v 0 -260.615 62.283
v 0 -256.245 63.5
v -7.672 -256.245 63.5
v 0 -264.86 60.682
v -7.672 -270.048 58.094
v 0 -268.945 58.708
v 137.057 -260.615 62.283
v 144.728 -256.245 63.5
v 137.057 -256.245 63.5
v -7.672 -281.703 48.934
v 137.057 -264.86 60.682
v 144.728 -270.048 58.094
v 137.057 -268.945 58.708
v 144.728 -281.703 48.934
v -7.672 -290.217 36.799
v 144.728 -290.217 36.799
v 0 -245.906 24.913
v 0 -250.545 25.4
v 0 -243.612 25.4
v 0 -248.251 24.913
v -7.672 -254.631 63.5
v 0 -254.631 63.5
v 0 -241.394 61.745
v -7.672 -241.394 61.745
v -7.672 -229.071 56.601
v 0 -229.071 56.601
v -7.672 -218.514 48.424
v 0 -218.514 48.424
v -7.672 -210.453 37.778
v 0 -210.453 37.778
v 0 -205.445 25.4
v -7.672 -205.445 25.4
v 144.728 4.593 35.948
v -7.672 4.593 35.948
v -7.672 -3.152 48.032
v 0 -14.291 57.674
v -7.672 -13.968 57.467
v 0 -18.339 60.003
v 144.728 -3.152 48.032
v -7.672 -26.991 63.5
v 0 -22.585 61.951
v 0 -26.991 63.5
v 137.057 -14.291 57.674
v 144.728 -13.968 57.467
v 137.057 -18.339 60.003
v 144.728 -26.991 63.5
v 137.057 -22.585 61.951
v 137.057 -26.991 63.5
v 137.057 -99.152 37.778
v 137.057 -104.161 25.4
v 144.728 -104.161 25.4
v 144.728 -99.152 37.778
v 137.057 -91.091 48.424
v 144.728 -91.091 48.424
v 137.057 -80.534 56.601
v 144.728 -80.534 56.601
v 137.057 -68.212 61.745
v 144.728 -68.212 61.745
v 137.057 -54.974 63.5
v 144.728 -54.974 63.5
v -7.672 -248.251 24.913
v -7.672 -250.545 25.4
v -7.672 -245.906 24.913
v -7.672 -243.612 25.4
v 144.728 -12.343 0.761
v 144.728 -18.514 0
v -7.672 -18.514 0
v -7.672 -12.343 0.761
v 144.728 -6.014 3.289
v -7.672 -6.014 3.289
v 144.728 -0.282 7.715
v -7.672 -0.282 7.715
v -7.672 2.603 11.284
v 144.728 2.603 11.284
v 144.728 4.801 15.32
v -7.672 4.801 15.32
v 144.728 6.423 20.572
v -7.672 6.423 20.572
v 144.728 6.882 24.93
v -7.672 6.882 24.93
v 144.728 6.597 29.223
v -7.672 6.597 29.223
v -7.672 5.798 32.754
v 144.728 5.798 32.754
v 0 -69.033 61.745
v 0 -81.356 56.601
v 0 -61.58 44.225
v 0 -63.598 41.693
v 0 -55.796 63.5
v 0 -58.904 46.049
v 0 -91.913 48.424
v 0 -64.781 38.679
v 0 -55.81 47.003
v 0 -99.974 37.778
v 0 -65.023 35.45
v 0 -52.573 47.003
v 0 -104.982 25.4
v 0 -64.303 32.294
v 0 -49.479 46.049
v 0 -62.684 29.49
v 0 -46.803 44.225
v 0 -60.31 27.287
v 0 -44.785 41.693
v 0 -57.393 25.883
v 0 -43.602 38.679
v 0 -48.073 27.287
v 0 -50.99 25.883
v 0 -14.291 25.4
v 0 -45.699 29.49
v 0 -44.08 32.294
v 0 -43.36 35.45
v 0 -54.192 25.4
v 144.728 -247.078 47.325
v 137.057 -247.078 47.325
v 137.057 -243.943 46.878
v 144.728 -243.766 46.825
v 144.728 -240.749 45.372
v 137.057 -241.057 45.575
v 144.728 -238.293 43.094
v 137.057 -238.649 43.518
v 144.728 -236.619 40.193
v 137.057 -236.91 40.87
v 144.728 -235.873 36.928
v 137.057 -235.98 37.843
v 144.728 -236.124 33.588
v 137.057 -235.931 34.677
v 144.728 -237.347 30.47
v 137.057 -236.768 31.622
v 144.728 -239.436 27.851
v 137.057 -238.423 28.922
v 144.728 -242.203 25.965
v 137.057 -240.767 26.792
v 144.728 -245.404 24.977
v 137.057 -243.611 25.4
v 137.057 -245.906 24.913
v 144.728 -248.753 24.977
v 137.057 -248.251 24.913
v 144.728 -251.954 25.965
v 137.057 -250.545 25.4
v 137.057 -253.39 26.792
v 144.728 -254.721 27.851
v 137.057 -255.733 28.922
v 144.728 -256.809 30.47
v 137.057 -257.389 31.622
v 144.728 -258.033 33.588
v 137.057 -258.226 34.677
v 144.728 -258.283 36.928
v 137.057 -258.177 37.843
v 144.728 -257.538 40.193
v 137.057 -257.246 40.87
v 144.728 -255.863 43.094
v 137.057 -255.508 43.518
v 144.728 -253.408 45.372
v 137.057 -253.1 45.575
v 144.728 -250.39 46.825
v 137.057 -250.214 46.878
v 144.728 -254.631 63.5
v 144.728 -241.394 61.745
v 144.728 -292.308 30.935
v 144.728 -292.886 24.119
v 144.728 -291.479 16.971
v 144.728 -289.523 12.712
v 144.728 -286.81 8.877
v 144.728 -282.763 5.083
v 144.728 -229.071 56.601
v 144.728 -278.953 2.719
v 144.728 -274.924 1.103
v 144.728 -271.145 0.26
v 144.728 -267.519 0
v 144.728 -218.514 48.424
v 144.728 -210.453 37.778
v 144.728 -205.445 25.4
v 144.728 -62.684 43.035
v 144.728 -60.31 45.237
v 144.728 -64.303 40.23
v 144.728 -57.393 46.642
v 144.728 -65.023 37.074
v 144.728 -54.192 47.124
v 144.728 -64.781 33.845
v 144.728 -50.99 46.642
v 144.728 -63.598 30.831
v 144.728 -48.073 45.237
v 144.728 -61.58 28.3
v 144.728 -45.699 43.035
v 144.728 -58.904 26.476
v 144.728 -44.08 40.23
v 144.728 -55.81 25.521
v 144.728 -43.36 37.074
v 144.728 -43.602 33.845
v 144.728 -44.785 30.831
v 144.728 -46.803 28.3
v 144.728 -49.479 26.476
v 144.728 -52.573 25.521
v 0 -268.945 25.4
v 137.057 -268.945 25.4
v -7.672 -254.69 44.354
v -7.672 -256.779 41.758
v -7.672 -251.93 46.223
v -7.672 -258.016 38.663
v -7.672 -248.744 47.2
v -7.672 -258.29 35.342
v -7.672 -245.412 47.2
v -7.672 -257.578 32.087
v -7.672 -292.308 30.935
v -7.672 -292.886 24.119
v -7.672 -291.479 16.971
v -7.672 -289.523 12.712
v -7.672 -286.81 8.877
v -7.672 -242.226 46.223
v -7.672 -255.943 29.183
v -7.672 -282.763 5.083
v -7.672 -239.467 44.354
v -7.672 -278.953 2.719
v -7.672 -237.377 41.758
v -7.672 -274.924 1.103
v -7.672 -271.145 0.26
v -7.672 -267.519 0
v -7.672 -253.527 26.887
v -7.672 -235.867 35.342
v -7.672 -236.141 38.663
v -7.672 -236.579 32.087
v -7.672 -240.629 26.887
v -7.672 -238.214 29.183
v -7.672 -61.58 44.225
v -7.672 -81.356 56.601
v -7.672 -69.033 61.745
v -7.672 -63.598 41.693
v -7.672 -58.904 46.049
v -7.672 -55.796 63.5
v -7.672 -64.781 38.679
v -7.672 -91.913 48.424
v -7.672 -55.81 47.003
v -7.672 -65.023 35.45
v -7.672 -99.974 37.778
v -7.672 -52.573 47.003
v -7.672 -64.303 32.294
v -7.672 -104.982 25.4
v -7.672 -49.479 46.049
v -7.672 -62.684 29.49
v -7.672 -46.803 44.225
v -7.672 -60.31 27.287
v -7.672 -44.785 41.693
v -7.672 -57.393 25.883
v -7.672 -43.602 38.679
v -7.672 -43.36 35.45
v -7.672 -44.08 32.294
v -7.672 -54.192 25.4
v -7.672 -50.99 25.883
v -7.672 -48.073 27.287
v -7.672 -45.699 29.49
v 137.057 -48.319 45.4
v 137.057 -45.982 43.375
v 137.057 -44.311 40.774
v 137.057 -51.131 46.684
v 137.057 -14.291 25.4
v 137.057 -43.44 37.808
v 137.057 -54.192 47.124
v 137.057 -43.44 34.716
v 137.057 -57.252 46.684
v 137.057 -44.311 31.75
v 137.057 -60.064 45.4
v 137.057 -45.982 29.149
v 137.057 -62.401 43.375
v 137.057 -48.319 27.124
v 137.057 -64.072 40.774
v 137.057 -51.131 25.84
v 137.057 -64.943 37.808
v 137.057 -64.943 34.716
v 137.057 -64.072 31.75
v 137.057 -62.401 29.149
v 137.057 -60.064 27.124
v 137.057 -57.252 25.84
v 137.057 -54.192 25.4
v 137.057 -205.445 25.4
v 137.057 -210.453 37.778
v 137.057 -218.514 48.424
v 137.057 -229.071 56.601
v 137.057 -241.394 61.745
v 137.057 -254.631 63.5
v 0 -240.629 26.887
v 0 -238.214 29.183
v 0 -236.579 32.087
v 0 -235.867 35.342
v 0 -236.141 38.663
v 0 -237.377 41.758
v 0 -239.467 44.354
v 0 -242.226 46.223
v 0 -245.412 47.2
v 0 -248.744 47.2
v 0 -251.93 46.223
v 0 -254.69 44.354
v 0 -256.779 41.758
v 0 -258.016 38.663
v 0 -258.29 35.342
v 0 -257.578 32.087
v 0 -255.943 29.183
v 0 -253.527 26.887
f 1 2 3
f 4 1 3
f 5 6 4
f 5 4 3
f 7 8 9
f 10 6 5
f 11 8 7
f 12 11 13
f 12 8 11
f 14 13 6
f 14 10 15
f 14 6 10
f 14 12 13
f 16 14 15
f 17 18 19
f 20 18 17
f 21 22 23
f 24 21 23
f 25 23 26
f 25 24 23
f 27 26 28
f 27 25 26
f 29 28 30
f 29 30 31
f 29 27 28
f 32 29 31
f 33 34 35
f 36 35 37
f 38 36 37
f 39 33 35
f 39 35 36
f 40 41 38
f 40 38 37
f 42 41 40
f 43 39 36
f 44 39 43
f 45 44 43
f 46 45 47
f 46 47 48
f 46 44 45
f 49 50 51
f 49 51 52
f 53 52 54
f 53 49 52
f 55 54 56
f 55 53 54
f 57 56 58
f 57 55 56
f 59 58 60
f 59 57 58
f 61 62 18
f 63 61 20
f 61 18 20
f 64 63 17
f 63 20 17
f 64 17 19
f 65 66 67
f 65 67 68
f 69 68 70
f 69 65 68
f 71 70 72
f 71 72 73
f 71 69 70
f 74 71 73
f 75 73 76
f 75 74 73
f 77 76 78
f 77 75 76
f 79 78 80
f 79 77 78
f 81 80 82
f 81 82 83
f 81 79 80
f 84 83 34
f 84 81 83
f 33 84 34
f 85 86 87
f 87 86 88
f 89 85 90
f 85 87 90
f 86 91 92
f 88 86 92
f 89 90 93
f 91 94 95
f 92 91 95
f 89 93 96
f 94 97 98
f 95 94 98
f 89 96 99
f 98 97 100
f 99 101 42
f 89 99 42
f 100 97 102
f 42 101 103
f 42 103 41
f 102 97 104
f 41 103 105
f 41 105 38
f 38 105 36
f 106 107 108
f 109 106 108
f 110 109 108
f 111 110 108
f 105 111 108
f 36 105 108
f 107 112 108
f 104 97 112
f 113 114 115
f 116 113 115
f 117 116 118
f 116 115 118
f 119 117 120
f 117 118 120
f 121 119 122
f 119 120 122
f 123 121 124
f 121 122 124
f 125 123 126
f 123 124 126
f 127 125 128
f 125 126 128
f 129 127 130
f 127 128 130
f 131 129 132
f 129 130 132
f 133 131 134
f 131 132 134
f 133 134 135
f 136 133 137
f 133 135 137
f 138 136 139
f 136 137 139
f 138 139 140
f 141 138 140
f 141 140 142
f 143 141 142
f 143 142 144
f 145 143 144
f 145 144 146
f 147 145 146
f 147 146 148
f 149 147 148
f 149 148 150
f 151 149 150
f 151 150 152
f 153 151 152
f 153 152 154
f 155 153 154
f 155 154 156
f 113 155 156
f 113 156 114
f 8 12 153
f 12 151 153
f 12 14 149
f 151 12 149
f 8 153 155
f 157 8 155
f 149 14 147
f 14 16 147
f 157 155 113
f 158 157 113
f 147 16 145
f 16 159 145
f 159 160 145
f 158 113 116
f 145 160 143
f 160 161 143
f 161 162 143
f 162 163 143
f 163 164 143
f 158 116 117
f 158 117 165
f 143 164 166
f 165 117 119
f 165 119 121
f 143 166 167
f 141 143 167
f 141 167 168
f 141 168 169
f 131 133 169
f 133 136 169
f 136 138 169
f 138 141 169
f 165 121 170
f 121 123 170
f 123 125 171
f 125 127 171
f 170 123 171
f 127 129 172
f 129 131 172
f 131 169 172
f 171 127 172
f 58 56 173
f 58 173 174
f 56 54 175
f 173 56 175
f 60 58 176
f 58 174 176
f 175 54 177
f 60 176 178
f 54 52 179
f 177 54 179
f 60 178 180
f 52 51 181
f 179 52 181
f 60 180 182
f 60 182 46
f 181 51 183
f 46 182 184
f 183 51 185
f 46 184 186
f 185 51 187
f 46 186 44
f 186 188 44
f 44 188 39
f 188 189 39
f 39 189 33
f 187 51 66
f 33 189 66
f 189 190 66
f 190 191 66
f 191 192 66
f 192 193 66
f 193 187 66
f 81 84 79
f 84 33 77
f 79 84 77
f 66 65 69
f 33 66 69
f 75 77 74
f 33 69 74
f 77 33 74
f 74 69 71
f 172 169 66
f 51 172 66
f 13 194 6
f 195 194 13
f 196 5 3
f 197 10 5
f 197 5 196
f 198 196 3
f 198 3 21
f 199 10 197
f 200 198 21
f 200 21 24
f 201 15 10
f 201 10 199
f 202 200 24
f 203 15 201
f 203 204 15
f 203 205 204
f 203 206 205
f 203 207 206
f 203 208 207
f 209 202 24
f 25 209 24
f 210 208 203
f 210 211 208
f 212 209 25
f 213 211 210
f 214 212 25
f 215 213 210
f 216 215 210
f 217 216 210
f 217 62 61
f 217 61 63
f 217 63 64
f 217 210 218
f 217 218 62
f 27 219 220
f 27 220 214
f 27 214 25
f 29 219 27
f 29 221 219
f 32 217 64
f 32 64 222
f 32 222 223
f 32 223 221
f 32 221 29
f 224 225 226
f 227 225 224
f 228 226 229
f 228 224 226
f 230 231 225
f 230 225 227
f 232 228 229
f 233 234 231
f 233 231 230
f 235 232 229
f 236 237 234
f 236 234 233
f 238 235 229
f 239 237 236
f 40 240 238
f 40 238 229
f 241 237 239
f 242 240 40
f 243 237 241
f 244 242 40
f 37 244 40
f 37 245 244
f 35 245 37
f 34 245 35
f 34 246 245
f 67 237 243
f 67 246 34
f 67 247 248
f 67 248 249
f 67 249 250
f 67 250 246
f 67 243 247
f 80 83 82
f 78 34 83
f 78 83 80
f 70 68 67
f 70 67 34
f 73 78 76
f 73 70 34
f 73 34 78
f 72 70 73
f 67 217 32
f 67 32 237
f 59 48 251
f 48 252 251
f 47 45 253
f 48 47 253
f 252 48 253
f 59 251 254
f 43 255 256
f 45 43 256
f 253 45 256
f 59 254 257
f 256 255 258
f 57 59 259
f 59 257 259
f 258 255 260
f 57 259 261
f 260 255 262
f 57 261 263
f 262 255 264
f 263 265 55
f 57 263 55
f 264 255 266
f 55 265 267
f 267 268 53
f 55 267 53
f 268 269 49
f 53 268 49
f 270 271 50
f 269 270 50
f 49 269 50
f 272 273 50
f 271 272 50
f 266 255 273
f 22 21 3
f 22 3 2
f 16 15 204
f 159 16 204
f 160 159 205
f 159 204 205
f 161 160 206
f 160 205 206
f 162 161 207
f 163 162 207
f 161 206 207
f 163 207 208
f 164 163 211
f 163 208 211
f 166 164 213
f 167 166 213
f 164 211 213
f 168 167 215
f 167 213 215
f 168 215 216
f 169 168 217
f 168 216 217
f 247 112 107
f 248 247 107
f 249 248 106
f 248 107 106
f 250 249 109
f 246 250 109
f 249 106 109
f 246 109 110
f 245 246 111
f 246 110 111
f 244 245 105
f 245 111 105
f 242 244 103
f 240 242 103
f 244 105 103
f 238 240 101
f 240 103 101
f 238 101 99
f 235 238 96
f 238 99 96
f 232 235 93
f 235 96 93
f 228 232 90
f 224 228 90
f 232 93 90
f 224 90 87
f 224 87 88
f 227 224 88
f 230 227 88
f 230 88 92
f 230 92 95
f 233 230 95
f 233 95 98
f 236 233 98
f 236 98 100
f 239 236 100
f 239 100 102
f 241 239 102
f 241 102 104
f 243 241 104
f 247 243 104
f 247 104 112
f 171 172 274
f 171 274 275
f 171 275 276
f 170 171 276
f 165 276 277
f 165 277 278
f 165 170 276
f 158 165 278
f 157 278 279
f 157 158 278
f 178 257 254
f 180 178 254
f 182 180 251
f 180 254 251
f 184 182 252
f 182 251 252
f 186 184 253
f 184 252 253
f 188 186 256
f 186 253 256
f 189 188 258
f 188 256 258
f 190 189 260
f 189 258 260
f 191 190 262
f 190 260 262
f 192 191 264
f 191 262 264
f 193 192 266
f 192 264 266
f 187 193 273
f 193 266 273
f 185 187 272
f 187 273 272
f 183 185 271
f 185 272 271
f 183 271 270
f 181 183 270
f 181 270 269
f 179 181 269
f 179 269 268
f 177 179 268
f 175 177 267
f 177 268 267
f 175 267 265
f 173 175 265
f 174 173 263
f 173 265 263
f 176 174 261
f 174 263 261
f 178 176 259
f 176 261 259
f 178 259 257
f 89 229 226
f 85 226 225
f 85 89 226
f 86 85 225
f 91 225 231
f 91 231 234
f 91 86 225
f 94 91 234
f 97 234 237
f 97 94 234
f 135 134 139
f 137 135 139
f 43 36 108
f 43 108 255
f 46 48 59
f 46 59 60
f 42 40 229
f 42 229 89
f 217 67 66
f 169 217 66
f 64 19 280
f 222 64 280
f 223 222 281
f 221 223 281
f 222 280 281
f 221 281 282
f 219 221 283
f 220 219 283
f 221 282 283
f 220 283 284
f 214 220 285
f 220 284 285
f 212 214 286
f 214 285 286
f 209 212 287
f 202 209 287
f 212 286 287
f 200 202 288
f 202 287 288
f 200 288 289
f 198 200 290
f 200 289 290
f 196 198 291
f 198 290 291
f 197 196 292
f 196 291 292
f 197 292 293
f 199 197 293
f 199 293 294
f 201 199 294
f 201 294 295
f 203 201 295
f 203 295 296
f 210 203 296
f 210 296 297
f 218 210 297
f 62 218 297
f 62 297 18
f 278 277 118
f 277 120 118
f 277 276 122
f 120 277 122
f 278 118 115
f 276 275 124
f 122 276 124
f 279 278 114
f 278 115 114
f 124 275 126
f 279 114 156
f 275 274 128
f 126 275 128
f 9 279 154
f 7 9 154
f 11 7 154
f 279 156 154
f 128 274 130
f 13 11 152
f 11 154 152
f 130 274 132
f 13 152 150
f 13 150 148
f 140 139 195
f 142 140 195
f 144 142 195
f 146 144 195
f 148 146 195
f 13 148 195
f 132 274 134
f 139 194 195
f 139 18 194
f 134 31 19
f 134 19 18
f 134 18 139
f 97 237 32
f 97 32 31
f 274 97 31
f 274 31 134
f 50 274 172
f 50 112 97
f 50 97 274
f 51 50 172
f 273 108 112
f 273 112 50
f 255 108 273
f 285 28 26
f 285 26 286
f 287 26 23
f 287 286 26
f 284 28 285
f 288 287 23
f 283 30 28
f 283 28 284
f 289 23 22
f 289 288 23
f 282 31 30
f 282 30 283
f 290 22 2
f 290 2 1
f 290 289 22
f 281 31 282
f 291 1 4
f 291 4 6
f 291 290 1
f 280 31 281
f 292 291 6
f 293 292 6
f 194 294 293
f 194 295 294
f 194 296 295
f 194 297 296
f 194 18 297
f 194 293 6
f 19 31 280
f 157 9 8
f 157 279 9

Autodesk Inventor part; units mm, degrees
ref_plane "YZ Plane" through (0, 0, 0) normal (1, 0, 0) x (0, 1, 0)
ref_plane "XZ Plane" through (0, 0, 0) normal (0, 1, 0) x (-1, 0, 0)
ref_plane "XY Plane" through (0, 0, 0) normal (0, 0, 1) x (1, 0, 0)
sketch "Sketch1" plane through (0, 0, 0) normal (0, 0, 1) x (1, 0, 0)
  line L0 (-7.6725, 9.18) -> (144.7275, 9.18)
  line L1 (144.7275, 9.18) -> (144.7275, -295.62)
  line L2 (144.7275, -295.62) -> (-7.6725, -295.62)
  line L3 (-7.6725, -295.62) -> (-7.6725, 9.18)
  point P0 (0, 0)
  dimension "d0" = 152.4
  dimension "d1" = 304.8
extrude "Extrusion1" add sketch "Sketch1" along normal blind 25.4
sketch "Sketch2" plane through (0, 0, 25.4) normal (0, 0, 1) x (1, 0, 0)
  line L0 (144.7275, 9.18) -> (-7.6725, 9.18) projected
  line L1 (-7.6725, 9.18) -> (-7.6725, -26.9908)
  line L2 (-7.6725, 9.18) -> (-7.6725, -295.62) projected
  line L3 (144.7275, -295.62) -> (144.7275, 9.18) projected
  line L4 (144.7275, 9.18) -> (144.7275, -26.9908)
  line L5 (144.7275, -26.9908) -> (-7.6725, -26.9908)
  line L6 (-7.6725, 9.18) -> (144.7275, 9.18)
  point P0 (0, 0)
extrude "Extrusion2" add sketch "Sketch2" along normal blind 38.1
fillet "Fillet1" radius 50.8 1 edges at (68.5275, 9.18, 63.5)
sketch "Sketch3" plane through (0, 0, 25.4) normal (0, 0, 1) x (1, 0, 0)
  line L0 (-7.6725, -26.9908) -> (-7.6725, -295.62) projected
  line L1 (-7.6725, -26.9908) -> (-7.6725, -104.161)
  line L2 (0, -104.161) -> (0, -26.9908)
  line L3 (0, -26.9908) -> (-7.6725, -26.9908)
  line L4 (0, -104.161) -> (-7.6725, -104.161)
  line L5 (144.7275, -26.9908) -> (-7.6725, -26.9908) projected
  line L6 (144.7275, -26.9908) -> (137.0567, -26.9908)
  line L7 (137.0567, -26.9908) -> (137.0567, -104.161)
  line L8 (137.0567, -104.161) -> (144.7275, -104.161)
  line L9 (144.7275, 9.18) -> (144.7275, -295.62) projected
  line L10 (144.7275, -26.9908) -> (144.7275, -104.161)
  point P0 (0, 0)
  dimension "d7" = 7.6708
extrude "Extrusion3" add sketch "Sketch3" along normal blind 38.1 contours L9 L8 L7 L5
sketch "Sketch4" plane through (0, 0, 25.4) normal (0, 0, 1) x (1, 0, 0)
  line L0 (-7.6725, -26.9908) -> (-7.6725, 9.18) projected
  line L1 (-7.6725, -26.9908) -> (0, -26.9908)
  line L2 (137.0567, -26.9908) -> (-7.6725, -26.9908) projected
  line L3 (-7.6725, -295.62) -> (-7.6725, 9.18) projected
  line L4 (0, -104.9824) -> (-7.6725, -104.9824)
  line L5 (-7.6725, -26.9908) -> (-7.6725, -104.9824)
  line L6 (0, -104.9824) -> (0, -26.9908)
  point P0 (0, 0)
extrude "Extrusion4" add sketch "Sketch4" along normal blind 38.1
fillet "Fillet2" radius 50.8 1 edges at (-3.8363, -104.9824, 63.5)
fillet "Fillet3" radius 50.8 1 edges at (140.8921, -104.161, 63.5)
sketch "Sketch5" plane through (137.0567, -26.9908, 25.4) normal (0, -1, 0) x (1, 0, 0)
  line L0 (-137.0567, 38.1) -> (0, 38.1) projected
  line L1 (-137.0567, 38.1) -> (-137.0567, 0) projected
  line L2 (-137.0567, 38.1) -> (-137.0567, 0)
  line L3 (0, 0) -> (-137.0567, 0) projected
  line L4 (-137.0567, 0) -> (0, 0)
  line L5 (0, 0) -> (0, 38.1) projected
  line L6 (0, 0) -> (0, 38.1)
  line L7 (0, 38.1) -> (-137.0567, 38.1)
  point P0 (-137.0567, -25.4)
extrude "Extrusion5" cut sketch "Sketch5" against normal blind 12.7
sketch "Sketch6" plane through (0, 0, 25.4) normal (0, 0, 1) x (1, 0, 0)
  line L0 (-7.6725, -295.62) -> (-7.6725, 9.18) projected
  line L1 (144.7275, -295.62) -> (-7.6725, -295.62)
  line L2 (-7.6725, -295.62) -> (-7.6725, -256.2446)
  line L3 (144.7275, -295.62) -> (144.7275, -256.2446)
  line L4 (144.7275, -295.62) -> (144.7275, -104.161) projected
  line L5 (-7.6725, -256.2446) -> (144.7275, -256.2446)
  point P0 (0, 0)
extrude "Extrusion6" add sketch "Sketch6" along normal blind 38.1
fillet "Fillet4" radius 50.8 1 edges at (68.5275, -295.62, 63.5)
sketch "Sketch7" plane through (0, 0, 25.4) normal (0, 0, 1) x (1, 0, 0)
  line L0 (137.676, -256.2446) -> (144.7275, -256.2446)
  line L1 (-7.6725, -295.62) -> (-7.6725, 9.18) projected
  line L2 (-7.6725, -256.2446) -> (144.7275, -256.2446) projected
  line L3 (-7.6725, -256.2446) -> (-7.6725, -205.4446)
  line L4 (-7.6725, -205.4446) -> (0, -205.4446)
  line L5 (0, -205.4446) -> (0, -256.2446)
  point P0 (0, 0)
  dimension "d20" = 50.8
extrude "Extrusion7" add sketch "Sketch7" along normal blind 38.1
sketch "Sketch8" plane through (0, 0, 25.4) normal (0, 0, 1) x (1, 0, 0)
  line L0 (0, -256.2446) -> (144.7275, -256.2446) projected
  line L1 (144.7275, -256.2446) -> (144.7275, -205.4446)
  line L2 (144.7275, -256.2446) -> (144.7275, -104.161) projected
  line L3 (144.7275, -205.4446) -> (137.0567, -205.4446)
  line L4 (137.0567, -205.4446) -> (137.0567, -256.2446)
  line L5 (137.0567, -256.2446) -> (144.7275, -256.2446)
  point P0 (0, 0)
  dimension "d23" = 50.8
  dimension "d24" = 7.6708
extrude "Extrusion8" add sketch "Sketch8" along normal blind 38.1
fillet "Fillet5" radius 50.8 2 edges at (-3.8363, -205.4446, 63.5) (140.8921, -205.4446, 63.5)
sketch "Sketch9" plane through (0, -256.2446, 63.5) normal (0, 1, 0) x (1, 0, 0)
  line L0 (0, 38.1) -> (137.0567, 38.1) projected
  line L1 (137.0567, 38.1) -> (0, 38.1)
  line L2 (0, 38.1) -> (0, 0) projected
  line L3 (0, 38.1) -> (0, 0)
  line L4 (137.0567, 0) -> (0, 0) projected
  line L5 (0, 0) -> (137.0567, 0)
  line L6 (137.0567, 0) -> (137.0567, 38.1)
  point P0 (0, 63.5)
extrude "Extrusion9" cut sketch "Sketch9" against normal blind 12.7
sketch "Sketch10" plane through (144.7275, -295.62, 0) normal (1, 0, 0) x (0, 0, -1)
  point P0 (0, 295.62)
fillet "Fillet6" radius 25.4 1 edges at (68.5275, -295.62, 0)
fillet "Fillet7" radius 25.4 1 edges at (68.5275, 9.18, 0)
sketch "Sketch21" plane through (0, 0, 25.4) normal (0, 0, 1) x (1, 0, 0)
  point P0 (0, 0)
sketch "Sketch22" plane through (0, 0, 25.4) normal (0, 0, 1) x (1, 0, 0)
  point P0 (0, 0)
sketch "Sketch23" plane through (0, -55.7956, 63.5) normal (1, 0, 0) x (0, 0, -1)
  point P0 (63.5, 55.7956)
sketch "Sketch24" plane through (0, -55.7956, 63.5) normal (1, 0, 0) x (0, 0, -1)
  circle A0 centre (27.2379, 1.6041) radius 10.8621
  line L0 (38.1, -49.1869) -> (38.1, 41.5047) projected
  point P0 (63.5, 55.7956)
extrude "Extrusion18" cut sketch "Sketch24" against normal blind 25.4
sketch "Sketch25" plane through (137.0567, -54.9742, 63.5) normal (-1, 0, 0) x (0, 0, 1)
  circle A0 centre (-27.2379, 0.7827) radius 10.8621 projected
  circle A1 centre (-27.2379, 0.7827) radius 10.8621
  point P0 (-63.5, 54.9742)
extrude "Extrusion19" cut sketch "Sketch25" against normal blind 25.4
sketch "Sketch26" plane through (137.0567, -268.9446, 25.4) normal (-1, 0, 0) x (0, 0, 1)
  circle A0 centre (10.6882, 21.8663) radius 11.2364
  point P0 (-25.4, 268.9446)
extrude "Extrusion20" cut sketch "Sketch26" against normal blind 25.4
sketch "Sketch27" plane through (0, -268.9446, 25.4) normal (1, 0, 0) x (0, 0, -1)
  arc A0 (0, 25.3331) -> (0, 18.3996) centre (-10.6882, 21.8663) ccw projected
  circle A1 centre (-10.6882, 21.8663) radius 11.2364
  point P0 (25.4, 268.9446)
extrude "Extrusion21" cut sketch "Sketch27" against normal blind 25.4
properties part number "chasis for robot car"
